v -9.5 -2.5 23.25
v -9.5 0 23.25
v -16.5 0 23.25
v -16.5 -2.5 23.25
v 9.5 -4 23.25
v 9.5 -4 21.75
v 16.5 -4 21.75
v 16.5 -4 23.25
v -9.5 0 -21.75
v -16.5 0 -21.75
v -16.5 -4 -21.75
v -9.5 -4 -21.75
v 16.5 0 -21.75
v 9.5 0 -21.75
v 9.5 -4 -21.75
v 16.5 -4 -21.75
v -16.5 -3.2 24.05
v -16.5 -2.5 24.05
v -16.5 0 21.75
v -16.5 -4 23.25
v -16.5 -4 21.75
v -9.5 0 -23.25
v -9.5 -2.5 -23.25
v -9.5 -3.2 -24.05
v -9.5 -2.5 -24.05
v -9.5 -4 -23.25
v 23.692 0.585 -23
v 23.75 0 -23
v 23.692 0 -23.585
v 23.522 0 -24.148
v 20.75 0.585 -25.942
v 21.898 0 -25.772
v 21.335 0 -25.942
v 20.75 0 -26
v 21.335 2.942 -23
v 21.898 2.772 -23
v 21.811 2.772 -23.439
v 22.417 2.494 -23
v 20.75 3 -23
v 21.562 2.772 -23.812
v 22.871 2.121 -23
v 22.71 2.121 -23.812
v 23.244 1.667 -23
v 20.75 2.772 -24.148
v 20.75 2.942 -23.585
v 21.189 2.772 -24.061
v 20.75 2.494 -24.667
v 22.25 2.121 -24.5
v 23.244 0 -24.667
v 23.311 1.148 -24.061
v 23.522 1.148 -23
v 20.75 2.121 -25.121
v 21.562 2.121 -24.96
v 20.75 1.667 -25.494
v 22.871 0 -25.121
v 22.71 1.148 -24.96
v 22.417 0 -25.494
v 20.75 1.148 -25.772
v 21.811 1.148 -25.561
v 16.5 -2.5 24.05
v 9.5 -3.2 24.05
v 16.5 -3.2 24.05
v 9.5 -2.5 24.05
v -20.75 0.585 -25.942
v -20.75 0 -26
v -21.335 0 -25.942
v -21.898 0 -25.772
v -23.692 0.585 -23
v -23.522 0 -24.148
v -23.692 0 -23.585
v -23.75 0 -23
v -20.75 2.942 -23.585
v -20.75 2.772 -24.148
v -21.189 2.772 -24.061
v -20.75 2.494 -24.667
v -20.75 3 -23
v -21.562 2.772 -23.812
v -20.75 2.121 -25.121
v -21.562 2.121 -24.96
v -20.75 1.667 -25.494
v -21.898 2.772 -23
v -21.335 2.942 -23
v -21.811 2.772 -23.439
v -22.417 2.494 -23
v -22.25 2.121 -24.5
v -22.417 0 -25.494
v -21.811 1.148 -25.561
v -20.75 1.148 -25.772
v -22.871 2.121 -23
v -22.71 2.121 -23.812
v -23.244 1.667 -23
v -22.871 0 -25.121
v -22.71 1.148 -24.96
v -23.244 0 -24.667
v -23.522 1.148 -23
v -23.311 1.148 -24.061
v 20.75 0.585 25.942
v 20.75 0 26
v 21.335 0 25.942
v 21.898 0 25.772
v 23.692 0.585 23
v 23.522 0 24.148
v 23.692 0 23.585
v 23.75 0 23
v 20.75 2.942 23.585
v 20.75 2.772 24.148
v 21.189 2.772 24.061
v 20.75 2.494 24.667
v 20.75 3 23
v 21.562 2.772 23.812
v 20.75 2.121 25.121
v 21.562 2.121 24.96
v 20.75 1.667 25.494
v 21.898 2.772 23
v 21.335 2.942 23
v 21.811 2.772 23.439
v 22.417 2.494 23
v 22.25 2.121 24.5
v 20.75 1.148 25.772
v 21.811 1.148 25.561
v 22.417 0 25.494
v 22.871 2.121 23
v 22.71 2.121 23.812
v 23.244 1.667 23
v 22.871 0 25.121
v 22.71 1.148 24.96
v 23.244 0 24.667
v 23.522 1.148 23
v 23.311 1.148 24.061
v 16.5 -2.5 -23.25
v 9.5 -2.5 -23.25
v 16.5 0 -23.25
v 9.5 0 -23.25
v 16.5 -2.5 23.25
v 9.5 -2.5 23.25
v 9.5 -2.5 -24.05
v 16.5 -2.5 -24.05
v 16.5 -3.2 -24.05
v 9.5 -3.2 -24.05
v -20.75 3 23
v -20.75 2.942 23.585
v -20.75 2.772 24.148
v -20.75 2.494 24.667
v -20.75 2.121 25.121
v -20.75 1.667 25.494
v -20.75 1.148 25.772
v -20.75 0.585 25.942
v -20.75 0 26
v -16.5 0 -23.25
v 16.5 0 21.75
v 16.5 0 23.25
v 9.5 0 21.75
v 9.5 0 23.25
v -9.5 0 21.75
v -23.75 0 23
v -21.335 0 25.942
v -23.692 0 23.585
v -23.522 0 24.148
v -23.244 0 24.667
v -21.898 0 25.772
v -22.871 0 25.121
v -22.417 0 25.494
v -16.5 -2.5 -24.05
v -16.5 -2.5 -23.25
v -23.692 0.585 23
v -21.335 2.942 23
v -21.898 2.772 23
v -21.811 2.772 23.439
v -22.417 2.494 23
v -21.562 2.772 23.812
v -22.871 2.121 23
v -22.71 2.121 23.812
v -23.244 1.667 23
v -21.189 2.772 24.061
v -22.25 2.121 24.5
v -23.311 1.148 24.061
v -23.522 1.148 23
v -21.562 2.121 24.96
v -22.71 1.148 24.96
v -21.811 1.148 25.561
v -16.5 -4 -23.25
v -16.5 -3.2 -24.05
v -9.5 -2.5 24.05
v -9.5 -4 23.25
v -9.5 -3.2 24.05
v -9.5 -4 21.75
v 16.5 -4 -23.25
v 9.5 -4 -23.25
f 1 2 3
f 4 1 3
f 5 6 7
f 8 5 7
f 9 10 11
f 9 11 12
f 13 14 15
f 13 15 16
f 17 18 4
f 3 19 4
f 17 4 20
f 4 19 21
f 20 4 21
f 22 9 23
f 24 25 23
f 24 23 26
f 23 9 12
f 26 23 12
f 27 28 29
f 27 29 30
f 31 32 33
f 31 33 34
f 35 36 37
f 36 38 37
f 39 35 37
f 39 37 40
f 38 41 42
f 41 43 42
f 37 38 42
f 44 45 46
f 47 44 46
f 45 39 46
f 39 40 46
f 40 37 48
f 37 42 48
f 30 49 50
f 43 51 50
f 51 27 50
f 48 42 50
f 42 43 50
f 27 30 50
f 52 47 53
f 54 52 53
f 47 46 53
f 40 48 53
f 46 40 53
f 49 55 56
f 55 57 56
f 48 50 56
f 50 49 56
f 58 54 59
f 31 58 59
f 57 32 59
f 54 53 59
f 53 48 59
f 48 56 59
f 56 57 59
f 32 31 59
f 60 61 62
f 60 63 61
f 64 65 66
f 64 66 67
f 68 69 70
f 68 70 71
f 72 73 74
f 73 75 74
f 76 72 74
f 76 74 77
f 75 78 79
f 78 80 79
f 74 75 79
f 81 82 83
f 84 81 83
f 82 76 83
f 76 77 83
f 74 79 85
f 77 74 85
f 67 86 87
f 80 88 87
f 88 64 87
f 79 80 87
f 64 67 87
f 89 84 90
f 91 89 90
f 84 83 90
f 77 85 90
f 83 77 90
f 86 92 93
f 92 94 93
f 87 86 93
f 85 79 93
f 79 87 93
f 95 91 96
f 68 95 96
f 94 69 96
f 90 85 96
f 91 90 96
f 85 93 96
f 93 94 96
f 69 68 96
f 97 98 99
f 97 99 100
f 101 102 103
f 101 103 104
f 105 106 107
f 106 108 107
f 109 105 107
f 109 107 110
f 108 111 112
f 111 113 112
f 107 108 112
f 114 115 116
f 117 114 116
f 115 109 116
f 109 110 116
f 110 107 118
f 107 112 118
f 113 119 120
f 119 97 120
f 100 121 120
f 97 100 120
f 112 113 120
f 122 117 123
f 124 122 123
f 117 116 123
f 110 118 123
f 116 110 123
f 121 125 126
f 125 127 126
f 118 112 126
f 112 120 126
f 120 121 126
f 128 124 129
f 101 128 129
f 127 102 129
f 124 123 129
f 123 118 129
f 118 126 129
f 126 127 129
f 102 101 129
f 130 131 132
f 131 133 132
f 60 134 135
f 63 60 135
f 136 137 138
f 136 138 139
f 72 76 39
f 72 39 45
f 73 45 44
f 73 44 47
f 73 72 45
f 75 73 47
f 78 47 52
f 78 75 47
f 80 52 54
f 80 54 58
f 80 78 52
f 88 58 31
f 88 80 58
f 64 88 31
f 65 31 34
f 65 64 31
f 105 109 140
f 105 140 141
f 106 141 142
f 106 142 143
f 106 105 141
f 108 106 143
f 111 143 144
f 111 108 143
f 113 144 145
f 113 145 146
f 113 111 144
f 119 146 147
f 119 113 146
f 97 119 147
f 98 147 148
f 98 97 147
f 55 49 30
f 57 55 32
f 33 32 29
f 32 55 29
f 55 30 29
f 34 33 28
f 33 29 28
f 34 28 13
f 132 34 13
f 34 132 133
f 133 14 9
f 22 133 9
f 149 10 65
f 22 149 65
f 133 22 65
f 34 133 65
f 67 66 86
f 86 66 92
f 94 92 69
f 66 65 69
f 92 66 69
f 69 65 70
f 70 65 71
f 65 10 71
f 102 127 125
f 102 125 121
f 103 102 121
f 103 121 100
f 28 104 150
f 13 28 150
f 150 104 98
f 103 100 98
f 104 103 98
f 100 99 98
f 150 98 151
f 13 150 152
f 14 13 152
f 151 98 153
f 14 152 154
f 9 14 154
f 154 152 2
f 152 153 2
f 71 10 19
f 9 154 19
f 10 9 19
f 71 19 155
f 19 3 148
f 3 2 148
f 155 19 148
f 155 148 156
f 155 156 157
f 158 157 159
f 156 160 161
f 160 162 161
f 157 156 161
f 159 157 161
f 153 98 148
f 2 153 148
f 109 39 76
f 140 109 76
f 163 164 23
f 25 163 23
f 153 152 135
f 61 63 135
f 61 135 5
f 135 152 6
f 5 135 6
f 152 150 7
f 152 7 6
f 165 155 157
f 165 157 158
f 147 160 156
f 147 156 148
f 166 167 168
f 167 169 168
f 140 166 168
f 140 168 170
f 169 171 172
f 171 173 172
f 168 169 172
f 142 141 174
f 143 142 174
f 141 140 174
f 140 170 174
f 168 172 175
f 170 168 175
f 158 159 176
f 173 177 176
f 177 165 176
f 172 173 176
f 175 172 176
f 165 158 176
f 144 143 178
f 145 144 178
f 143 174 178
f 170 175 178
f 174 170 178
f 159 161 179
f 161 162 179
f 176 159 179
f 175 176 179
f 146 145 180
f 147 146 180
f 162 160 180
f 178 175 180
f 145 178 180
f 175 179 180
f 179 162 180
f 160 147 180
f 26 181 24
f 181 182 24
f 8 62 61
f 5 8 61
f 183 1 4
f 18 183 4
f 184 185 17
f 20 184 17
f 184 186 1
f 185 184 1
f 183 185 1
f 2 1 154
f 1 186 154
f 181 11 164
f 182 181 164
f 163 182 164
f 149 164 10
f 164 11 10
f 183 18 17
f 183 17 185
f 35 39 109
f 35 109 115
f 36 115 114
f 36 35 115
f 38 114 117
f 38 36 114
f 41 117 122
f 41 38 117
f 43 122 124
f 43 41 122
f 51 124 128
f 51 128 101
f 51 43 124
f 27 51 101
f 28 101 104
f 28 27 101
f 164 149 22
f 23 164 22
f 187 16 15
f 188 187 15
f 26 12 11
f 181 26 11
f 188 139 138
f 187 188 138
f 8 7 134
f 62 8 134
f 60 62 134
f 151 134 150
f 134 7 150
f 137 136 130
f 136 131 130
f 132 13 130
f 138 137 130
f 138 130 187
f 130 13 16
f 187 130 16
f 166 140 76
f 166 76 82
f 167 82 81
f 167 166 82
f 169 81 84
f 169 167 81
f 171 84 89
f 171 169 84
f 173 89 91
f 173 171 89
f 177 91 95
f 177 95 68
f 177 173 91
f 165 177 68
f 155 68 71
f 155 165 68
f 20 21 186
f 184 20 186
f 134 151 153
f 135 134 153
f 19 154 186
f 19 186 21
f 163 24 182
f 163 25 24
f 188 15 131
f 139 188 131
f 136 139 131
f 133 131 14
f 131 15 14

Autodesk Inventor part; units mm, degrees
ref_plane "YZ Plane" through (0, 0, 0) normal (1, 0, 0) x (0, 1, 0)
ref_plane "XZ Plane" through (0, 0, 0) normal (0, 1, 0) x (-1, 0, 0)
ref_plane "XY Plane" through (0, 0, 0) normal (0, 0, 1) x (1, 0, 0)
sketch "Sketch1" plane through (0, 0, 0) normal (0, 1, 0) x (-1, 0, 0)
  line L0 (23.75, 26) -> (-23.75, 26)
  line L1 (-23.75, 26) -> (-23.75, -26)
  line L2 (-23.75, -26) -> (23.75, -26)
  line L3 (23.75, -26) -> (23.75, 26)
  line L4 (23.75, 26) -> (-23.75, -26) construction
  line L5 (-23.75, 26) -> (23.75, -26) construction
  point P0 (0, 0)
  point P1 (0, -26)
  dimension "d0" = 47.5
  dimension "d1" = 52
extrude "Extrusion1" add sketch "Sketch1" along normal blind 3
fillet "Fillet1" radius 3 4 edges at (0, 3, -26) (-23.75, 3, 0) (0, 3, 26) (23.75, 3, 0)
sketch "Sketch2" plane through (0, 0, 0) normal (0, -1, 0) x (1, 0, 0)
  line L0 (-23.75, -26) -> (-23.75, 26) construction
  line L1 (23.75, -26) -> (-23.75, -26) construction
  line L2 (21, 23.25) -> (-21, 23.25)
  line L3 (-21, 23.25) -> (-21, -23.25)
  line L4 (-21, -23.25) -> (21, -23.25)
  line L5 (21, -23.25) -> (21, 23.25)
  line L6 (21, 23.25) -> (-21, -23.25) construction
  line L7 (-21, 23.25) -> (21, -23.25) construction
  line L8 (16.5, -23.25) -> (9.5, -23.25)
  line L9 (9.5, -23.25) -> (9.5, -21.75)
  line L10 (9.5, -21.75) -> (16.5, -21.75)
  line L11 (16.5, -21.75) -> (16.5, -23.25)
  point P0 (0, 0)
  dimension "d5" = 2.75
  dimension "d6" = 2.75
  dimension "d7" = 7
  dimension "d8" = 1.5
  dimension "d9" = 9.5
extrude "Extrusion2" add sketch "Sketch2" along normal blind 4 contours L4 L9 L10 L11
sketch "Sketch3" plane through (16.5, 0, -23.25) normal (0, 0, -1) x (-1, 0, 0)
  line L0 (7, 0) -> (7, -4) construction
  line L1 (0, -4) -> (7, -4)
  line L2 (7, -4) -> (7, -2.5)
  line L3 (7, -2.5) -> (0, -2.5)
  line L4 (0, -2.5) -> (0, -4)
  point P0 (16.5, 0)
  dimension "d12" = 1.5
extrude "Extrusion3" add sketch "Sketch3" along normal blind 0.8
chamfer "Chamfer1" distance 0.8 angle 45 1 edges at (13, -4, -24.05)
fillet "Fillet2" radius 3 4 edges at (22.8713, 2.1213, 25.1213) (-22.8713, 2.1213, 25.1213) (-22.8713, 2.1213, -25.1213) (22.8713, 2.1213, -25.1213)
mirror "Mirror1" about plane through (0, 0, 0) normal (1, 0, 0) of "Extrusion2", "Chamfer1", "Extrusion3"
mirror "Mirror2" about plane through (0, 0, 0) normal (0, 0, 1) of "Extrusion2", "Chamfer1", "Extrusion3", "Mirror1"
properties part number "capac baterie"
